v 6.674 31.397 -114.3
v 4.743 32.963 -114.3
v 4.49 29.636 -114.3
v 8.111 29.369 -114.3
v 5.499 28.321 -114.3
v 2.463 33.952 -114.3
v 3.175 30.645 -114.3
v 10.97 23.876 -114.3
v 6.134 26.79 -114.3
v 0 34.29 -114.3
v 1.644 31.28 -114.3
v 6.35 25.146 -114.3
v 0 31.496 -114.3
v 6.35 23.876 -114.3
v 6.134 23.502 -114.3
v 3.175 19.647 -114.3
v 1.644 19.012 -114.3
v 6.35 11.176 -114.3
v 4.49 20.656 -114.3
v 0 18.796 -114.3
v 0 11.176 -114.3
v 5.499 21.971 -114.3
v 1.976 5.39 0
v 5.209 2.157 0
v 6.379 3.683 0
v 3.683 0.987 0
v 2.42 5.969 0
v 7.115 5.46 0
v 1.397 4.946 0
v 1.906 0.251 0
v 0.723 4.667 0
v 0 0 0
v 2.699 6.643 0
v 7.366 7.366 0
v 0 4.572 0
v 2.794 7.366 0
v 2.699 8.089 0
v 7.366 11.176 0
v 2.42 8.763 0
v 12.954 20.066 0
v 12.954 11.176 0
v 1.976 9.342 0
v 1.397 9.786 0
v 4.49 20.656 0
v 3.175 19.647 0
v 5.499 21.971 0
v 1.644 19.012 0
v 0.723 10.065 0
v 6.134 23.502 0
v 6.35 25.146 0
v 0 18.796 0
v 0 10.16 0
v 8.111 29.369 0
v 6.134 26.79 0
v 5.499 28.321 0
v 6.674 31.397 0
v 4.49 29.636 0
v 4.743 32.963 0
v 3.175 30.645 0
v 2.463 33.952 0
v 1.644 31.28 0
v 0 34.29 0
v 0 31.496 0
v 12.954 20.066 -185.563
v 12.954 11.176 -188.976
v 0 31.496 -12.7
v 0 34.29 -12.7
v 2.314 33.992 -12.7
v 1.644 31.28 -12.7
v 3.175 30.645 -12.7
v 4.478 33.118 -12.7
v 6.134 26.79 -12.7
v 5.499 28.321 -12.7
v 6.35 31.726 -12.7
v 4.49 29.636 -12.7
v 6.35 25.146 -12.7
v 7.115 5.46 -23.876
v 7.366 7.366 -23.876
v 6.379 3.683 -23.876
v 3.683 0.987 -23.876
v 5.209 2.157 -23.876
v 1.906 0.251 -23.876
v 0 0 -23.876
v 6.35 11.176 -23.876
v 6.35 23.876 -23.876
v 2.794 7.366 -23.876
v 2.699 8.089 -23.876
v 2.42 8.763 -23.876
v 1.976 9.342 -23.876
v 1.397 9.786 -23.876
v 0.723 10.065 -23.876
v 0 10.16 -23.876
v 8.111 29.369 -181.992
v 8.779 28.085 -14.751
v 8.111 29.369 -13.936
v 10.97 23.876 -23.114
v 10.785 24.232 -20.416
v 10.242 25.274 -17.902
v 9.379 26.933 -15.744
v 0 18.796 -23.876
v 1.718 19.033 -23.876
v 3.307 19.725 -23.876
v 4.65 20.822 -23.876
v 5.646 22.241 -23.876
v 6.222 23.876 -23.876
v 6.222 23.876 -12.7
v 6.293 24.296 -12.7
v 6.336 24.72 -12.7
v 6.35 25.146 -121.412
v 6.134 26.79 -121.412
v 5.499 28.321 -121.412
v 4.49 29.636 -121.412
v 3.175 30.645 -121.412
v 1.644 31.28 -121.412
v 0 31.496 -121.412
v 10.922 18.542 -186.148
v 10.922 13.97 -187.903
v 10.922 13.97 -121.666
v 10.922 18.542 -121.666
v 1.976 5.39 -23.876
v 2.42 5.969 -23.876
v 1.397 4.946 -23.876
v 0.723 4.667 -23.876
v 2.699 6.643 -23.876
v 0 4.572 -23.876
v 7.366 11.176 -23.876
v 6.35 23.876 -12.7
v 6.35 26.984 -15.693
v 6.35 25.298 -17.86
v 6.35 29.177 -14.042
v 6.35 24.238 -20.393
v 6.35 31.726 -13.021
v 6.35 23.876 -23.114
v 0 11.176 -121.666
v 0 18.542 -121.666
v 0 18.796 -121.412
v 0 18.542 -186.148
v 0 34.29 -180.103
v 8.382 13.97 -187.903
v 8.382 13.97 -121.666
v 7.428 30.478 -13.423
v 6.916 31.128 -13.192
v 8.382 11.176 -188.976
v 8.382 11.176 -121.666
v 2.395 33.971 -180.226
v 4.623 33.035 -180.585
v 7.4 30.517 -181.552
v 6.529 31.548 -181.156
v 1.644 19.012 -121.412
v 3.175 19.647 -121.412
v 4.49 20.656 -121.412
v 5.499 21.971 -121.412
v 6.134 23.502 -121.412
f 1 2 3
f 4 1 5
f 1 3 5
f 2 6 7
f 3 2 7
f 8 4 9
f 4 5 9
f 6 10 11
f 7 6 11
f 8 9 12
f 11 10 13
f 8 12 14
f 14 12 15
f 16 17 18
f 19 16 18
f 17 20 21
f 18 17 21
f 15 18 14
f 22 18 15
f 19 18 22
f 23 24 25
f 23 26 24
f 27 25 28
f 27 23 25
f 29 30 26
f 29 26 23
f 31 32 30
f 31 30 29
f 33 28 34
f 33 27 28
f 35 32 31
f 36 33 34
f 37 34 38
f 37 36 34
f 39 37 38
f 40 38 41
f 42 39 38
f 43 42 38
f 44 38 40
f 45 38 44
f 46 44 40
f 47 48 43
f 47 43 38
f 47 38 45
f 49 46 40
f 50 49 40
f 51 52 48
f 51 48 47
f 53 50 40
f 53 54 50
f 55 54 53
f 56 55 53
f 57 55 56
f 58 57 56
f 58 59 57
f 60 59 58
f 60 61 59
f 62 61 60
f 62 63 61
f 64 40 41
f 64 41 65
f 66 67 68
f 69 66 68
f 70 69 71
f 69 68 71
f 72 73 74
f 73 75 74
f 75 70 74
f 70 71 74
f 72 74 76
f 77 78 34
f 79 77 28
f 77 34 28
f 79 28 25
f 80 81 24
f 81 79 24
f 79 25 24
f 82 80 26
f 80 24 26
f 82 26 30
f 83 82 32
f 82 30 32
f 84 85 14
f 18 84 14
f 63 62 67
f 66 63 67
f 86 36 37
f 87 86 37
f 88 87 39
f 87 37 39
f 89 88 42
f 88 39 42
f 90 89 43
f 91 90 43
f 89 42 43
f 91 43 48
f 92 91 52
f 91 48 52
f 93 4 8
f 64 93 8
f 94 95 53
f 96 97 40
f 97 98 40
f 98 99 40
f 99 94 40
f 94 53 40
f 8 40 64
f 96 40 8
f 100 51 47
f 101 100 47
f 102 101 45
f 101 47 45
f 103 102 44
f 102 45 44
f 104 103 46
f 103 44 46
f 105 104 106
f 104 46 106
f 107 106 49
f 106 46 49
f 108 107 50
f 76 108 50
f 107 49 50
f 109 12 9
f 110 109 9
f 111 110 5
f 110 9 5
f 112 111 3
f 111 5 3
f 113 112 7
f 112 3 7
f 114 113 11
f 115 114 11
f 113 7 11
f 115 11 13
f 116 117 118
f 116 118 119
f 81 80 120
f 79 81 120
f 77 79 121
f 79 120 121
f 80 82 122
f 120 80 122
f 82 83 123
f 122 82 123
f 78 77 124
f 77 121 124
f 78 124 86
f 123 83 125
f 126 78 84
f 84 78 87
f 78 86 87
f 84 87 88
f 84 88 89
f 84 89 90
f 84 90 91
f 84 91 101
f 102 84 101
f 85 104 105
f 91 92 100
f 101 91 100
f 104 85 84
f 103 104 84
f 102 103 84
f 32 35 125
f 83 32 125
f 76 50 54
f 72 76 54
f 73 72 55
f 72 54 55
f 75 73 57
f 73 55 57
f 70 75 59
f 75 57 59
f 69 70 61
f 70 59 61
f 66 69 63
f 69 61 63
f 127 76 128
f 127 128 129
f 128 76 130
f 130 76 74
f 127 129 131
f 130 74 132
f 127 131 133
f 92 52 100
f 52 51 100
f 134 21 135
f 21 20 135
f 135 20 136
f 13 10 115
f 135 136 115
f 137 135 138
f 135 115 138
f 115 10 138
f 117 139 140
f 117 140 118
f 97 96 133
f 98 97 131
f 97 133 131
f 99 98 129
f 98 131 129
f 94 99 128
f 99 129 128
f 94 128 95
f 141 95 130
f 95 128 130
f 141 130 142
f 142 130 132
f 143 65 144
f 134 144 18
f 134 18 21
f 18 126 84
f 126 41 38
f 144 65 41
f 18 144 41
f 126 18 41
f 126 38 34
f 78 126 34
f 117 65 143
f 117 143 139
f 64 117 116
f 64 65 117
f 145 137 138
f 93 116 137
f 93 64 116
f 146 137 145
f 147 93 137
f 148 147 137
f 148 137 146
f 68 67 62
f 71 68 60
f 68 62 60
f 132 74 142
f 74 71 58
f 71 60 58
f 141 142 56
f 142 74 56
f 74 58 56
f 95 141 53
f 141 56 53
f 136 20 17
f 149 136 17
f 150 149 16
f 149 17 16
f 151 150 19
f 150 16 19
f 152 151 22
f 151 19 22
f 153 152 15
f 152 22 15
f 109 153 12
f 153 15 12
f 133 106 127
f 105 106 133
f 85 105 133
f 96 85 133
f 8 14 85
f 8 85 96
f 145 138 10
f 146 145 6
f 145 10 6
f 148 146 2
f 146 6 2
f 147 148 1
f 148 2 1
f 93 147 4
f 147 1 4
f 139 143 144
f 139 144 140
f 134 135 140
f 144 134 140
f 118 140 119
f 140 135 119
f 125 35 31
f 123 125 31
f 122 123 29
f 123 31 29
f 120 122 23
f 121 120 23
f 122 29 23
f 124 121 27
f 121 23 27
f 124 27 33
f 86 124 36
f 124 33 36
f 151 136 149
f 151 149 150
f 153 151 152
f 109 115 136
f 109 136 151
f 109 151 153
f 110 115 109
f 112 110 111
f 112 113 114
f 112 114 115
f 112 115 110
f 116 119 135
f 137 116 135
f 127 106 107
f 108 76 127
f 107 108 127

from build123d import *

# Parameters (mm, degrees)
SKETCH1_W                = 188.976
SKETCH1_H                = 34.29
BOSS_EXTRUDE1_DEPTH      = 12.954
CUT_EXTRUDE1_DEPTH       = 121.412
CUT_EXTRUDE2_DEPTH       = 25.4
SKETCH3_W                = 165.1
SKETCH3_H                = 11.176
CUT_EXTRUDE3_DEPTH       = 193.498152698
CUT_EXTRUDE4_DEPTH       = 25.4
SKETCH5_W                = 6.35
SKETCH5_H                = 90.424
CUT_EXTRUDE6_DEPTH       = 193.498152698
SKETCH5_4_W              = 6.35
SKETCH5_4_H              = 11.176
CUT_EXTRUDE7_DEPTH       = 10.414
CUT_EXTRUDE8_DEPTH       = 193.498152698
CUT_EXTRUDE9_DEPTH       = 193.17529886
CUT_EXTRUDE10_DEPTH      = 193.498152715
CUT_EXTRUDE10_DEPTH_BACK = 193.498152715
CUT_EXTRUDE12_DEPTH      = 67.31


with BuildPart() as part:
    # Sketch1 → Boss-Extrude1 (new body)
    with BuildSketch(Plane(origin=(0, 0, 0), x_dir=(0, 0, -1), z_dir=(1, 0, 0))):
        with Locations((94.488, 17.145)):
            Rectangle(SKETCH1_W, SKETCH1_H)
    extrude(amount=BOSS_EXTRUDE1_DEPTH)

    # Sketch2 → Cut-Extrude1 (cut)
    with BuildSketch(Plane.XY):
        with BuildLine():
            Line((0, 31.496), (0, 18.796))
            ThreePointArc((0, 18.796), (4.490128061, 20.655871939), (6.35, 25.146))
            ThreePointArc((6.35, 25.146), (4.490128061, 29.636128061), (0, 31.496))
        make_face()
    extrude(amount=-CUT_EXTRUDE1_DEPTH, mode=Mode.SUBTRACT)

    # Sketch2<3> → Cut-Extrude2 (cut)
    with BuildSketch(Plane.XY):
        with BuildLine():
            ThreePointArc((0, 4.572), (1.975656347, 5.390343653), (2.794, 7.366))
            ThreePointArc((2.794, 7.366), (1.975656347, 9.341656347), (0, 10.16))
            Line((0, 10.16), (0, 4.572))
        make_face()
    extrude(amount=-CUT_EXTRUDE2_DEPTH, mode=Mode.SUBTRACT)

    # Sketch3 → Cut-Extrude3 (cut, through all)
    with BuildSketch(Plane.ZY):
        with Locations((-106.426, 5.588)):
            Rectangle(SKETCH3_W, SKETCH3_H)
    extrude(amount=-CUT_EXTRUDE3_DEPTH, mode=Mode.SUBTRACT)

    # Sketch4 → Cut-Extrude4 (cut)
    with BuildSketch(Plane.XY):
        with BuildLine():
            Line((7.366, 11.176), (7.366, 7.366))
            ThreePointArc((7.366, 7.366), (5.20854855, 2.15745145), (0, 0))
            Line((0, 0), (12.954, 0))
            Line((12.954, 0), (12.954, 11.176))
            Line((12.954, 11.176), (7.366, 11.176))
        make_face()
    extrude(amount=-CUT_EXTRUDE4_DEPTH, mode=Mode.SUBTRACT)

    # Sketch5 → Cut-Extrude6 (cut, through all)
    with BuildSketch(Plane(origin=(0, 34.29, 0), x_dir=(1, 0, 0), z_dir=(0, 1, 0))):
        with Locations((3.175, 69.088)):
            Rectangle(SKETCH5_W, SKETCH5_H)
    extrude(amount=-CUT_EXTRUDE6_DEPTH, mode=Mode.SUBTRACT)

    # Sketch5<4> → Cut-Extrude7 (cut)
    with BuildSketch(Plane(origin=(0, 34.29, 0), x_dir=(1, 0, 0), z_dir=(0, 1, 0))):
        with Locations((3.175, 18.288)):
            Rectangle(SKETCH5_4_W, SKETCH5_4_H)
    extrude(amount=-CUT_EXTRUDE7_DEPTH, mode=Mode.SUBTRACT)

    # Sketch6 → Cut-Extrude8 (cut, through all)
    with BuildSketch(Plane.XY):
        with BuildLine():
            ThreePointArc((0, 34.29), (4.74341842, 32.963462356), (8.110563197, 29.368736153))
            Line((8.110563197, 29.368736153), (12.954, 20.066))
            Line((12.954, 20.066), (12.954, 34.29))
            Line((12.954, 34.29), (0, 34.29))
        make_face()
    extrude(amount=-CUT_EXTRUDE8_DEPTH, mode=Mode.SUBTRACT)

    # Sketch7 → Cut-Extrude9 (cut, through all)
    with BuildSketch(Plane.ZY.offset(-6.35)):
        with BuildLine():
            Line((-114.3, 34.29), (-114.3, 23.876))
            Line((-114.3, 23.876), (-23.114000049, 23.876))
            ThreePointArc((-23.114000049, 23.876), (-15.750189998, 26.926189963), (-12.7, 34.29))
            Line((-12.7, 34.29), (-114.3, 34.29))
        make_face()
    extrude(amount=-CUT_EXTRUDE9_DEPTH, mode=Mode.SUBTRACT)

    # Sketch8 → Cut-Extrude10 (cut, two sides: drawn at the far end of the back side and taken through both)
    with BuildSketch(Plane.ZY.offset(-CUT_EXTRUDE10_DEPTH_BACK)):
        Polygon((-188.976, 34.29), (-188.976, 11.176), (-180.103366694, 34.29), align=None)
    extrude(amount=CUT_EXTRUDE10_DEPTH + CUT_EXTRUDE10_DEPTH_BACK, mode=Mode.SUBTRACT)

    # Sketch12 → Cut-Extrude12 (cut)
    with BuildSketch(Plane.XY.offset(-188.976)):
        Polygon((0, 11.176), (8.382, 11.176), (8.382, 13.97), (10.922, 13.97), (10.922, 18.542), (0, 18.542), align=None)
    extrude(amount=CUT_EXTRUDE12_DEPTH, mode=Mode.SUBTRACT)


solid = part.part
